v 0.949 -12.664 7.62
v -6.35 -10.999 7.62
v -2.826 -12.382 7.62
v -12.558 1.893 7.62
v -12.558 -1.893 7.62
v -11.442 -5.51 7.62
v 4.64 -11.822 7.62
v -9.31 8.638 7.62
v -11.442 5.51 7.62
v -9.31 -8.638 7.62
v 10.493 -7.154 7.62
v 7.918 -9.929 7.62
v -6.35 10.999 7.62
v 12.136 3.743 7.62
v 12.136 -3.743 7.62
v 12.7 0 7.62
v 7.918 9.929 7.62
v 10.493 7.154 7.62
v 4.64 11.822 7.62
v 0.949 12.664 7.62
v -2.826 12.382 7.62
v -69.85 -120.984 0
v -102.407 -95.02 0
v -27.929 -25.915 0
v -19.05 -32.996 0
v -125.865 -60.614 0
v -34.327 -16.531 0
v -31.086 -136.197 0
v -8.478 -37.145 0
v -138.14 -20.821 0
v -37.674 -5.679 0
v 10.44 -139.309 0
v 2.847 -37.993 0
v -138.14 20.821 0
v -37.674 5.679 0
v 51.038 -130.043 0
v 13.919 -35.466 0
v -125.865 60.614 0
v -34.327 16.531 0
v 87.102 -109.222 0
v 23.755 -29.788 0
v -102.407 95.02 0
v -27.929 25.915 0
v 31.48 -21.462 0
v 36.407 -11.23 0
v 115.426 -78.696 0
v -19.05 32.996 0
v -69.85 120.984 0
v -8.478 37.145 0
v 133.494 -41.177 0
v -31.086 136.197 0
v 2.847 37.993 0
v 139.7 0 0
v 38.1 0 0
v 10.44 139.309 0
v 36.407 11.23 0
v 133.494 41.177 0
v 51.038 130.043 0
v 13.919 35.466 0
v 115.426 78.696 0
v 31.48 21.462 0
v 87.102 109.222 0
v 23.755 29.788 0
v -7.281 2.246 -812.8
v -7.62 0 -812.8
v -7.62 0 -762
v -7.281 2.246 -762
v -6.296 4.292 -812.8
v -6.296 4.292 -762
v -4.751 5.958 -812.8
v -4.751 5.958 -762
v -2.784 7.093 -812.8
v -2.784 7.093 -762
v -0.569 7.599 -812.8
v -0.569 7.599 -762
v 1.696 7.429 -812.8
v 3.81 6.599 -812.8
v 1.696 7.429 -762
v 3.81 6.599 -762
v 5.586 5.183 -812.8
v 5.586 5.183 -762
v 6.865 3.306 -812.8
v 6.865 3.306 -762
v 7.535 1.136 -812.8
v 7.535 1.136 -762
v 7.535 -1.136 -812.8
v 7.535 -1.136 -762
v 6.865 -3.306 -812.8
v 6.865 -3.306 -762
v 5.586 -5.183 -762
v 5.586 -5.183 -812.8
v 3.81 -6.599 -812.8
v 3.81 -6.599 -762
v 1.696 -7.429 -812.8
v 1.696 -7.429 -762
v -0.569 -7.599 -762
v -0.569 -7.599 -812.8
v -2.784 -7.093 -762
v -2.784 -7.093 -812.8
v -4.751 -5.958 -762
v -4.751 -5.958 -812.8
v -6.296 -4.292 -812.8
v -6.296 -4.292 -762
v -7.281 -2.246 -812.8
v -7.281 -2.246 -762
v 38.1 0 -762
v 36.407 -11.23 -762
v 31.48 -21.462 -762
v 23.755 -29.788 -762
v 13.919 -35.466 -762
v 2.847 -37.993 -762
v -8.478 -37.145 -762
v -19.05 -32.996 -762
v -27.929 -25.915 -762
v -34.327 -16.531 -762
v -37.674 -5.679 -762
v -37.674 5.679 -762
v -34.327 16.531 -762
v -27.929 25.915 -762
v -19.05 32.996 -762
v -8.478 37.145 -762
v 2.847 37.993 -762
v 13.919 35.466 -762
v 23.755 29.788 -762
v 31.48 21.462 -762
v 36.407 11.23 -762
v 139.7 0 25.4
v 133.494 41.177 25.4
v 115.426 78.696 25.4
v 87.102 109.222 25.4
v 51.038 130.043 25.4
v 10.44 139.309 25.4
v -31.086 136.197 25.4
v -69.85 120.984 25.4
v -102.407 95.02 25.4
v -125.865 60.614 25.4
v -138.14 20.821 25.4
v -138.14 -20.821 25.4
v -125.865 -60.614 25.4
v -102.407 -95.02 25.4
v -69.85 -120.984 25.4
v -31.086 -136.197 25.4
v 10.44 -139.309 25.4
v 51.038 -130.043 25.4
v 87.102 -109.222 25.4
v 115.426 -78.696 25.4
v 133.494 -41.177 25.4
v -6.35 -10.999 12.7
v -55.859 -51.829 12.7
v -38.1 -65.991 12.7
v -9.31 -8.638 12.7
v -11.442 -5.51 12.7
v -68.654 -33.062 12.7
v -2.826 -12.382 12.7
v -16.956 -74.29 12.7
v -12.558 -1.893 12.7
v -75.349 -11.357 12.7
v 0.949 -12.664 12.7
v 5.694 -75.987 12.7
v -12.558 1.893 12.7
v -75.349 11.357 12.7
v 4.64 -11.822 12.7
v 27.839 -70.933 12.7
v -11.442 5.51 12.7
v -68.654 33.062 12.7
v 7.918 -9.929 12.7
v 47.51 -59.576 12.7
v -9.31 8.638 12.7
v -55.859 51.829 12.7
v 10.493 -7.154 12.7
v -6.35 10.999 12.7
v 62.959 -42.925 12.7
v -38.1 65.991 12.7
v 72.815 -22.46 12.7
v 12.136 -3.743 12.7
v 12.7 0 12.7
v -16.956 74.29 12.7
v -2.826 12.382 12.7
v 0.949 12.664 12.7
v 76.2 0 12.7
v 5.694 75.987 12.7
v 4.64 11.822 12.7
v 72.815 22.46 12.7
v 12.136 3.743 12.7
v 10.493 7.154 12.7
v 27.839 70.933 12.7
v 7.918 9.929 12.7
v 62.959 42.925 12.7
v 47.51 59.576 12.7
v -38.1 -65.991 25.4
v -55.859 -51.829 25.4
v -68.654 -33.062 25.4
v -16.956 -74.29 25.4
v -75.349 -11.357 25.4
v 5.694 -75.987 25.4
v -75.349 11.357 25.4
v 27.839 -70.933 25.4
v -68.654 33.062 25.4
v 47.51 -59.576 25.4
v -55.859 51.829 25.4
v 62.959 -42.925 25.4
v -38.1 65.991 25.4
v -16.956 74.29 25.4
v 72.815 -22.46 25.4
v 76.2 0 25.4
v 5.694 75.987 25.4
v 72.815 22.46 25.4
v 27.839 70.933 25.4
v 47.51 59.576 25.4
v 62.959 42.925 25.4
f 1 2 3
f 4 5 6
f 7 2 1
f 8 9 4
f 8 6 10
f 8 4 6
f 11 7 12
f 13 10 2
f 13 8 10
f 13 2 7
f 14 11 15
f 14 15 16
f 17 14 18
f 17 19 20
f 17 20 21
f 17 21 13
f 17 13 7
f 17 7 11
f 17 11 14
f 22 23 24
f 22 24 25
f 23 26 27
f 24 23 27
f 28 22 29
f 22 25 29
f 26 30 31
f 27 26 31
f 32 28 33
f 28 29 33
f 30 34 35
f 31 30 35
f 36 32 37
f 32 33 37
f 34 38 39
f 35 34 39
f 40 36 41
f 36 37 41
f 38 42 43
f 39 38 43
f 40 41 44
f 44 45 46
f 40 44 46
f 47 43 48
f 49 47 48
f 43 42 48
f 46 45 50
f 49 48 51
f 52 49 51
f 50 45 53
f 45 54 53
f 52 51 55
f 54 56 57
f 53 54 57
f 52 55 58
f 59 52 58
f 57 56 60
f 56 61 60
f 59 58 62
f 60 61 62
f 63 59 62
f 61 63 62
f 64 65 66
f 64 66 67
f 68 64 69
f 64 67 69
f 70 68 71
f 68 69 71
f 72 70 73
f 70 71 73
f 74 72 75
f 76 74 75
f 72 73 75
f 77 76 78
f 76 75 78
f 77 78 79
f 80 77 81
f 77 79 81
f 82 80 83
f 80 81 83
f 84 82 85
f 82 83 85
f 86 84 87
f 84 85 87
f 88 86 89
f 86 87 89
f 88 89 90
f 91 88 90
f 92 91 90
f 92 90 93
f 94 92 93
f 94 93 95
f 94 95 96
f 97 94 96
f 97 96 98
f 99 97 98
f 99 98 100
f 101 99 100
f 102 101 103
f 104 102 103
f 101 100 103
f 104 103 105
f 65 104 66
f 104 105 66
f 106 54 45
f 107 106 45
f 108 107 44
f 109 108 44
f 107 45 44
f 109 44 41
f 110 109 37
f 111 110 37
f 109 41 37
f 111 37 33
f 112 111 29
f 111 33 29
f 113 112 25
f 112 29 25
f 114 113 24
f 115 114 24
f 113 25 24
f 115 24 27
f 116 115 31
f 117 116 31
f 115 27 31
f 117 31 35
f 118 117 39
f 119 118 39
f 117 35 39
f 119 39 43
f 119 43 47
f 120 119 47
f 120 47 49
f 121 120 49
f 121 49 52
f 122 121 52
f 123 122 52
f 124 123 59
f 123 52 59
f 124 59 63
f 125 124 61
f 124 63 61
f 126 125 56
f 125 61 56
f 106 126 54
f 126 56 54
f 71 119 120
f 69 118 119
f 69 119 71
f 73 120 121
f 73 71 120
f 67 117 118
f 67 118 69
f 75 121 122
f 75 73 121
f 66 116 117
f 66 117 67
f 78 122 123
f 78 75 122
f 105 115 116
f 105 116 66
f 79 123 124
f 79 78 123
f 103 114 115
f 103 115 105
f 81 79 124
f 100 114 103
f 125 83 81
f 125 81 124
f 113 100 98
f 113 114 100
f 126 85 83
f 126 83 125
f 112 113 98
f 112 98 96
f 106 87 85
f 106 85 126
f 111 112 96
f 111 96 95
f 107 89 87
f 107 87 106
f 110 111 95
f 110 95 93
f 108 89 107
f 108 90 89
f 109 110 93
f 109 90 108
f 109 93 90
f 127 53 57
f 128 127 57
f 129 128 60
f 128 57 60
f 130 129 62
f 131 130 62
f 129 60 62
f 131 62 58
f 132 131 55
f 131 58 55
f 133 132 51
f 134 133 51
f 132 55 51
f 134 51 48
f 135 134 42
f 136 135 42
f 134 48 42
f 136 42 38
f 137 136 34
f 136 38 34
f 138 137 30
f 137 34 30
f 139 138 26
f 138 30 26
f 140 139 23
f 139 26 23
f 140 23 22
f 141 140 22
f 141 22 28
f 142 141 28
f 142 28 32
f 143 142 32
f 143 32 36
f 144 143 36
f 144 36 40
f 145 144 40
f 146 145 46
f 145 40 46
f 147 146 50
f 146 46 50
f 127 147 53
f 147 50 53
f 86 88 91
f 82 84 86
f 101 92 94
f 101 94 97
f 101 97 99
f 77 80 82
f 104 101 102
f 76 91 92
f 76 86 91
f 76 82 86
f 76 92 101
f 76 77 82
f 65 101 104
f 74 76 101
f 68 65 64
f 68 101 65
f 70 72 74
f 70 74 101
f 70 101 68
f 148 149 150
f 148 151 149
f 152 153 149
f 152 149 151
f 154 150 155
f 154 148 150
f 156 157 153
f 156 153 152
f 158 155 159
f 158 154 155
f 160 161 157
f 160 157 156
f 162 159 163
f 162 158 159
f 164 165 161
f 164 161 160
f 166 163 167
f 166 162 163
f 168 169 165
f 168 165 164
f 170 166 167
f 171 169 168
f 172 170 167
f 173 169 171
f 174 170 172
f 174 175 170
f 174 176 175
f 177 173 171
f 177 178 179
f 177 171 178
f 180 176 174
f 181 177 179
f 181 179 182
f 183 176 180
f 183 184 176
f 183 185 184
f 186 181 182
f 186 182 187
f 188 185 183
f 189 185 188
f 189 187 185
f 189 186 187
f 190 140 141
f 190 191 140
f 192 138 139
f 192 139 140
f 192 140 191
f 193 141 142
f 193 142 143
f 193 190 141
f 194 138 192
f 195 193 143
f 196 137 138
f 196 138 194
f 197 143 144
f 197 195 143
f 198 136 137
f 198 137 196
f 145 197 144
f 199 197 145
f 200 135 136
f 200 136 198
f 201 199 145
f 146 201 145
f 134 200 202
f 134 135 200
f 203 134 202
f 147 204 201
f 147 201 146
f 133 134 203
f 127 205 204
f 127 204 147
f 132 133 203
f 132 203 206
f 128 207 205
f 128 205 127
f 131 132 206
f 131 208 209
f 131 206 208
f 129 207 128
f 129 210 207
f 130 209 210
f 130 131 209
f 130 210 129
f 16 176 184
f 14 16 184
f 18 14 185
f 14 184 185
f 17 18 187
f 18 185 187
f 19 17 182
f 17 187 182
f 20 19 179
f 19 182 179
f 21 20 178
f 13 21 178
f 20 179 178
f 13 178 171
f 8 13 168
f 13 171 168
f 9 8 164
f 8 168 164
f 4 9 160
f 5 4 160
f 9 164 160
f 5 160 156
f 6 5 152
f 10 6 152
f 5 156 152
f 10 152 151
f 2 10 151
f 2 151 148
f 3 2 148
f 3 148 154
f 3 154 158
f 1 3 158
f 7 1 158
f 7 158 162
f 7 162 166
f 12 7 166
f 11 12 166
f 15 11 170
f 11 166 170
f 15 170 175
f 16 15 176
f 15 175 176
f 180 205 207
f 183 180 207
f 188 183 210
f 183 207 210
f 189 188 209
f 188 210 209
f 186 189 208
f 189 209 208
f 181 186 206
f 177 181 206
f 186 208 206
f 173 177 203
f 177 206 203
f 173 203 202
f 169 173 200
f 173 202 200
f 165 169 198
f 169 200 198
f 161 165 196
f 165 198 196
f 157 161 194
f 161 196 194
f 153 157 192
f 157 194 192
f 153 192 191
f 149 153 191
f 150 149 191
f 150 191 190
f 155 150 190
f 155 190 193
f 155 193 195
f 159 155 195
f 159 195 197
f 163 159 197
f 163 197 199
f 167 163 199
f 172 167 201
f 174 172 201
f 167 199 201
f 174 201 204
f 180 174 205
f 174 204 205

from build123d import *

# Parameters (mm, degrees)
SKETCH1_R           = 139.7
BOSS_EXTRUDE1_DEPTH = 25.4
SKETCH3_R           = 38.1
BOSS_EXTRUDE2_DEPTH = 762
SKETCH5_R           = 7.62
BOSS_EXTRUDE3_DEPTH = 50.8
SKETCH7_R           = 76.2
CUT_EXTRUDE1_DEPTH  = 12.7
SKETCH9_R           = 12.7
CUT_EXTRUDE3_DEPTH  = 5.08


with BuildPart() as part:
    # Sketch1 → Boss-Extrude1 (new body)
    with BuildSketch(Plane.XY):
        Circle(SKETCH1_R)
    extrude(amount=BOSS_EXTRUDE1_DEPTH)

    # Sketch3 → Boss-Extrude2 (add)
    with BuildSketch(Plane(origin=(0, 0, 0), x_dir=(-1, 0, 0), z_dir=(0, 0, -1))):
        with Locations(Location((0, 0, 0), (0, 0, 180))):
            Circle(SKETCH3_R)
    extrude(amount=BOSS_EXTRUDE2_DEPTH)

    # Sketch5 → Boss-Extrude3 (add)
    with BuildSketch(Plane(origin=(0, 0, -762), x_dir=(-1, 0, 0), z_dir=(0, 0, -1))):
        Circle(SKETCH5_R)
    extrude(amount=BOSS_EXTRUDE3_DEPTH)

    # Sketch7 → Cut-Extrude1 (cut)
    with BuildSketch(Plane.XY.offset(25.4)):
        Circle(SKETCH7_R)
    extrude(amount=-CUT_EXTRUDE1_DEPTH, mode=Mode.SUBTRACT)

    # Sketch9 → Cut-Extrude3 (cut)
    with BuildSketch(Plane.XY.offset(12.7)):
        Circle(SKETCH9_R)
    extrude(amount=-CUT_EXTRUDE3_DEPTH, mode=Mode.SUBTRACT)


solid = part.part
